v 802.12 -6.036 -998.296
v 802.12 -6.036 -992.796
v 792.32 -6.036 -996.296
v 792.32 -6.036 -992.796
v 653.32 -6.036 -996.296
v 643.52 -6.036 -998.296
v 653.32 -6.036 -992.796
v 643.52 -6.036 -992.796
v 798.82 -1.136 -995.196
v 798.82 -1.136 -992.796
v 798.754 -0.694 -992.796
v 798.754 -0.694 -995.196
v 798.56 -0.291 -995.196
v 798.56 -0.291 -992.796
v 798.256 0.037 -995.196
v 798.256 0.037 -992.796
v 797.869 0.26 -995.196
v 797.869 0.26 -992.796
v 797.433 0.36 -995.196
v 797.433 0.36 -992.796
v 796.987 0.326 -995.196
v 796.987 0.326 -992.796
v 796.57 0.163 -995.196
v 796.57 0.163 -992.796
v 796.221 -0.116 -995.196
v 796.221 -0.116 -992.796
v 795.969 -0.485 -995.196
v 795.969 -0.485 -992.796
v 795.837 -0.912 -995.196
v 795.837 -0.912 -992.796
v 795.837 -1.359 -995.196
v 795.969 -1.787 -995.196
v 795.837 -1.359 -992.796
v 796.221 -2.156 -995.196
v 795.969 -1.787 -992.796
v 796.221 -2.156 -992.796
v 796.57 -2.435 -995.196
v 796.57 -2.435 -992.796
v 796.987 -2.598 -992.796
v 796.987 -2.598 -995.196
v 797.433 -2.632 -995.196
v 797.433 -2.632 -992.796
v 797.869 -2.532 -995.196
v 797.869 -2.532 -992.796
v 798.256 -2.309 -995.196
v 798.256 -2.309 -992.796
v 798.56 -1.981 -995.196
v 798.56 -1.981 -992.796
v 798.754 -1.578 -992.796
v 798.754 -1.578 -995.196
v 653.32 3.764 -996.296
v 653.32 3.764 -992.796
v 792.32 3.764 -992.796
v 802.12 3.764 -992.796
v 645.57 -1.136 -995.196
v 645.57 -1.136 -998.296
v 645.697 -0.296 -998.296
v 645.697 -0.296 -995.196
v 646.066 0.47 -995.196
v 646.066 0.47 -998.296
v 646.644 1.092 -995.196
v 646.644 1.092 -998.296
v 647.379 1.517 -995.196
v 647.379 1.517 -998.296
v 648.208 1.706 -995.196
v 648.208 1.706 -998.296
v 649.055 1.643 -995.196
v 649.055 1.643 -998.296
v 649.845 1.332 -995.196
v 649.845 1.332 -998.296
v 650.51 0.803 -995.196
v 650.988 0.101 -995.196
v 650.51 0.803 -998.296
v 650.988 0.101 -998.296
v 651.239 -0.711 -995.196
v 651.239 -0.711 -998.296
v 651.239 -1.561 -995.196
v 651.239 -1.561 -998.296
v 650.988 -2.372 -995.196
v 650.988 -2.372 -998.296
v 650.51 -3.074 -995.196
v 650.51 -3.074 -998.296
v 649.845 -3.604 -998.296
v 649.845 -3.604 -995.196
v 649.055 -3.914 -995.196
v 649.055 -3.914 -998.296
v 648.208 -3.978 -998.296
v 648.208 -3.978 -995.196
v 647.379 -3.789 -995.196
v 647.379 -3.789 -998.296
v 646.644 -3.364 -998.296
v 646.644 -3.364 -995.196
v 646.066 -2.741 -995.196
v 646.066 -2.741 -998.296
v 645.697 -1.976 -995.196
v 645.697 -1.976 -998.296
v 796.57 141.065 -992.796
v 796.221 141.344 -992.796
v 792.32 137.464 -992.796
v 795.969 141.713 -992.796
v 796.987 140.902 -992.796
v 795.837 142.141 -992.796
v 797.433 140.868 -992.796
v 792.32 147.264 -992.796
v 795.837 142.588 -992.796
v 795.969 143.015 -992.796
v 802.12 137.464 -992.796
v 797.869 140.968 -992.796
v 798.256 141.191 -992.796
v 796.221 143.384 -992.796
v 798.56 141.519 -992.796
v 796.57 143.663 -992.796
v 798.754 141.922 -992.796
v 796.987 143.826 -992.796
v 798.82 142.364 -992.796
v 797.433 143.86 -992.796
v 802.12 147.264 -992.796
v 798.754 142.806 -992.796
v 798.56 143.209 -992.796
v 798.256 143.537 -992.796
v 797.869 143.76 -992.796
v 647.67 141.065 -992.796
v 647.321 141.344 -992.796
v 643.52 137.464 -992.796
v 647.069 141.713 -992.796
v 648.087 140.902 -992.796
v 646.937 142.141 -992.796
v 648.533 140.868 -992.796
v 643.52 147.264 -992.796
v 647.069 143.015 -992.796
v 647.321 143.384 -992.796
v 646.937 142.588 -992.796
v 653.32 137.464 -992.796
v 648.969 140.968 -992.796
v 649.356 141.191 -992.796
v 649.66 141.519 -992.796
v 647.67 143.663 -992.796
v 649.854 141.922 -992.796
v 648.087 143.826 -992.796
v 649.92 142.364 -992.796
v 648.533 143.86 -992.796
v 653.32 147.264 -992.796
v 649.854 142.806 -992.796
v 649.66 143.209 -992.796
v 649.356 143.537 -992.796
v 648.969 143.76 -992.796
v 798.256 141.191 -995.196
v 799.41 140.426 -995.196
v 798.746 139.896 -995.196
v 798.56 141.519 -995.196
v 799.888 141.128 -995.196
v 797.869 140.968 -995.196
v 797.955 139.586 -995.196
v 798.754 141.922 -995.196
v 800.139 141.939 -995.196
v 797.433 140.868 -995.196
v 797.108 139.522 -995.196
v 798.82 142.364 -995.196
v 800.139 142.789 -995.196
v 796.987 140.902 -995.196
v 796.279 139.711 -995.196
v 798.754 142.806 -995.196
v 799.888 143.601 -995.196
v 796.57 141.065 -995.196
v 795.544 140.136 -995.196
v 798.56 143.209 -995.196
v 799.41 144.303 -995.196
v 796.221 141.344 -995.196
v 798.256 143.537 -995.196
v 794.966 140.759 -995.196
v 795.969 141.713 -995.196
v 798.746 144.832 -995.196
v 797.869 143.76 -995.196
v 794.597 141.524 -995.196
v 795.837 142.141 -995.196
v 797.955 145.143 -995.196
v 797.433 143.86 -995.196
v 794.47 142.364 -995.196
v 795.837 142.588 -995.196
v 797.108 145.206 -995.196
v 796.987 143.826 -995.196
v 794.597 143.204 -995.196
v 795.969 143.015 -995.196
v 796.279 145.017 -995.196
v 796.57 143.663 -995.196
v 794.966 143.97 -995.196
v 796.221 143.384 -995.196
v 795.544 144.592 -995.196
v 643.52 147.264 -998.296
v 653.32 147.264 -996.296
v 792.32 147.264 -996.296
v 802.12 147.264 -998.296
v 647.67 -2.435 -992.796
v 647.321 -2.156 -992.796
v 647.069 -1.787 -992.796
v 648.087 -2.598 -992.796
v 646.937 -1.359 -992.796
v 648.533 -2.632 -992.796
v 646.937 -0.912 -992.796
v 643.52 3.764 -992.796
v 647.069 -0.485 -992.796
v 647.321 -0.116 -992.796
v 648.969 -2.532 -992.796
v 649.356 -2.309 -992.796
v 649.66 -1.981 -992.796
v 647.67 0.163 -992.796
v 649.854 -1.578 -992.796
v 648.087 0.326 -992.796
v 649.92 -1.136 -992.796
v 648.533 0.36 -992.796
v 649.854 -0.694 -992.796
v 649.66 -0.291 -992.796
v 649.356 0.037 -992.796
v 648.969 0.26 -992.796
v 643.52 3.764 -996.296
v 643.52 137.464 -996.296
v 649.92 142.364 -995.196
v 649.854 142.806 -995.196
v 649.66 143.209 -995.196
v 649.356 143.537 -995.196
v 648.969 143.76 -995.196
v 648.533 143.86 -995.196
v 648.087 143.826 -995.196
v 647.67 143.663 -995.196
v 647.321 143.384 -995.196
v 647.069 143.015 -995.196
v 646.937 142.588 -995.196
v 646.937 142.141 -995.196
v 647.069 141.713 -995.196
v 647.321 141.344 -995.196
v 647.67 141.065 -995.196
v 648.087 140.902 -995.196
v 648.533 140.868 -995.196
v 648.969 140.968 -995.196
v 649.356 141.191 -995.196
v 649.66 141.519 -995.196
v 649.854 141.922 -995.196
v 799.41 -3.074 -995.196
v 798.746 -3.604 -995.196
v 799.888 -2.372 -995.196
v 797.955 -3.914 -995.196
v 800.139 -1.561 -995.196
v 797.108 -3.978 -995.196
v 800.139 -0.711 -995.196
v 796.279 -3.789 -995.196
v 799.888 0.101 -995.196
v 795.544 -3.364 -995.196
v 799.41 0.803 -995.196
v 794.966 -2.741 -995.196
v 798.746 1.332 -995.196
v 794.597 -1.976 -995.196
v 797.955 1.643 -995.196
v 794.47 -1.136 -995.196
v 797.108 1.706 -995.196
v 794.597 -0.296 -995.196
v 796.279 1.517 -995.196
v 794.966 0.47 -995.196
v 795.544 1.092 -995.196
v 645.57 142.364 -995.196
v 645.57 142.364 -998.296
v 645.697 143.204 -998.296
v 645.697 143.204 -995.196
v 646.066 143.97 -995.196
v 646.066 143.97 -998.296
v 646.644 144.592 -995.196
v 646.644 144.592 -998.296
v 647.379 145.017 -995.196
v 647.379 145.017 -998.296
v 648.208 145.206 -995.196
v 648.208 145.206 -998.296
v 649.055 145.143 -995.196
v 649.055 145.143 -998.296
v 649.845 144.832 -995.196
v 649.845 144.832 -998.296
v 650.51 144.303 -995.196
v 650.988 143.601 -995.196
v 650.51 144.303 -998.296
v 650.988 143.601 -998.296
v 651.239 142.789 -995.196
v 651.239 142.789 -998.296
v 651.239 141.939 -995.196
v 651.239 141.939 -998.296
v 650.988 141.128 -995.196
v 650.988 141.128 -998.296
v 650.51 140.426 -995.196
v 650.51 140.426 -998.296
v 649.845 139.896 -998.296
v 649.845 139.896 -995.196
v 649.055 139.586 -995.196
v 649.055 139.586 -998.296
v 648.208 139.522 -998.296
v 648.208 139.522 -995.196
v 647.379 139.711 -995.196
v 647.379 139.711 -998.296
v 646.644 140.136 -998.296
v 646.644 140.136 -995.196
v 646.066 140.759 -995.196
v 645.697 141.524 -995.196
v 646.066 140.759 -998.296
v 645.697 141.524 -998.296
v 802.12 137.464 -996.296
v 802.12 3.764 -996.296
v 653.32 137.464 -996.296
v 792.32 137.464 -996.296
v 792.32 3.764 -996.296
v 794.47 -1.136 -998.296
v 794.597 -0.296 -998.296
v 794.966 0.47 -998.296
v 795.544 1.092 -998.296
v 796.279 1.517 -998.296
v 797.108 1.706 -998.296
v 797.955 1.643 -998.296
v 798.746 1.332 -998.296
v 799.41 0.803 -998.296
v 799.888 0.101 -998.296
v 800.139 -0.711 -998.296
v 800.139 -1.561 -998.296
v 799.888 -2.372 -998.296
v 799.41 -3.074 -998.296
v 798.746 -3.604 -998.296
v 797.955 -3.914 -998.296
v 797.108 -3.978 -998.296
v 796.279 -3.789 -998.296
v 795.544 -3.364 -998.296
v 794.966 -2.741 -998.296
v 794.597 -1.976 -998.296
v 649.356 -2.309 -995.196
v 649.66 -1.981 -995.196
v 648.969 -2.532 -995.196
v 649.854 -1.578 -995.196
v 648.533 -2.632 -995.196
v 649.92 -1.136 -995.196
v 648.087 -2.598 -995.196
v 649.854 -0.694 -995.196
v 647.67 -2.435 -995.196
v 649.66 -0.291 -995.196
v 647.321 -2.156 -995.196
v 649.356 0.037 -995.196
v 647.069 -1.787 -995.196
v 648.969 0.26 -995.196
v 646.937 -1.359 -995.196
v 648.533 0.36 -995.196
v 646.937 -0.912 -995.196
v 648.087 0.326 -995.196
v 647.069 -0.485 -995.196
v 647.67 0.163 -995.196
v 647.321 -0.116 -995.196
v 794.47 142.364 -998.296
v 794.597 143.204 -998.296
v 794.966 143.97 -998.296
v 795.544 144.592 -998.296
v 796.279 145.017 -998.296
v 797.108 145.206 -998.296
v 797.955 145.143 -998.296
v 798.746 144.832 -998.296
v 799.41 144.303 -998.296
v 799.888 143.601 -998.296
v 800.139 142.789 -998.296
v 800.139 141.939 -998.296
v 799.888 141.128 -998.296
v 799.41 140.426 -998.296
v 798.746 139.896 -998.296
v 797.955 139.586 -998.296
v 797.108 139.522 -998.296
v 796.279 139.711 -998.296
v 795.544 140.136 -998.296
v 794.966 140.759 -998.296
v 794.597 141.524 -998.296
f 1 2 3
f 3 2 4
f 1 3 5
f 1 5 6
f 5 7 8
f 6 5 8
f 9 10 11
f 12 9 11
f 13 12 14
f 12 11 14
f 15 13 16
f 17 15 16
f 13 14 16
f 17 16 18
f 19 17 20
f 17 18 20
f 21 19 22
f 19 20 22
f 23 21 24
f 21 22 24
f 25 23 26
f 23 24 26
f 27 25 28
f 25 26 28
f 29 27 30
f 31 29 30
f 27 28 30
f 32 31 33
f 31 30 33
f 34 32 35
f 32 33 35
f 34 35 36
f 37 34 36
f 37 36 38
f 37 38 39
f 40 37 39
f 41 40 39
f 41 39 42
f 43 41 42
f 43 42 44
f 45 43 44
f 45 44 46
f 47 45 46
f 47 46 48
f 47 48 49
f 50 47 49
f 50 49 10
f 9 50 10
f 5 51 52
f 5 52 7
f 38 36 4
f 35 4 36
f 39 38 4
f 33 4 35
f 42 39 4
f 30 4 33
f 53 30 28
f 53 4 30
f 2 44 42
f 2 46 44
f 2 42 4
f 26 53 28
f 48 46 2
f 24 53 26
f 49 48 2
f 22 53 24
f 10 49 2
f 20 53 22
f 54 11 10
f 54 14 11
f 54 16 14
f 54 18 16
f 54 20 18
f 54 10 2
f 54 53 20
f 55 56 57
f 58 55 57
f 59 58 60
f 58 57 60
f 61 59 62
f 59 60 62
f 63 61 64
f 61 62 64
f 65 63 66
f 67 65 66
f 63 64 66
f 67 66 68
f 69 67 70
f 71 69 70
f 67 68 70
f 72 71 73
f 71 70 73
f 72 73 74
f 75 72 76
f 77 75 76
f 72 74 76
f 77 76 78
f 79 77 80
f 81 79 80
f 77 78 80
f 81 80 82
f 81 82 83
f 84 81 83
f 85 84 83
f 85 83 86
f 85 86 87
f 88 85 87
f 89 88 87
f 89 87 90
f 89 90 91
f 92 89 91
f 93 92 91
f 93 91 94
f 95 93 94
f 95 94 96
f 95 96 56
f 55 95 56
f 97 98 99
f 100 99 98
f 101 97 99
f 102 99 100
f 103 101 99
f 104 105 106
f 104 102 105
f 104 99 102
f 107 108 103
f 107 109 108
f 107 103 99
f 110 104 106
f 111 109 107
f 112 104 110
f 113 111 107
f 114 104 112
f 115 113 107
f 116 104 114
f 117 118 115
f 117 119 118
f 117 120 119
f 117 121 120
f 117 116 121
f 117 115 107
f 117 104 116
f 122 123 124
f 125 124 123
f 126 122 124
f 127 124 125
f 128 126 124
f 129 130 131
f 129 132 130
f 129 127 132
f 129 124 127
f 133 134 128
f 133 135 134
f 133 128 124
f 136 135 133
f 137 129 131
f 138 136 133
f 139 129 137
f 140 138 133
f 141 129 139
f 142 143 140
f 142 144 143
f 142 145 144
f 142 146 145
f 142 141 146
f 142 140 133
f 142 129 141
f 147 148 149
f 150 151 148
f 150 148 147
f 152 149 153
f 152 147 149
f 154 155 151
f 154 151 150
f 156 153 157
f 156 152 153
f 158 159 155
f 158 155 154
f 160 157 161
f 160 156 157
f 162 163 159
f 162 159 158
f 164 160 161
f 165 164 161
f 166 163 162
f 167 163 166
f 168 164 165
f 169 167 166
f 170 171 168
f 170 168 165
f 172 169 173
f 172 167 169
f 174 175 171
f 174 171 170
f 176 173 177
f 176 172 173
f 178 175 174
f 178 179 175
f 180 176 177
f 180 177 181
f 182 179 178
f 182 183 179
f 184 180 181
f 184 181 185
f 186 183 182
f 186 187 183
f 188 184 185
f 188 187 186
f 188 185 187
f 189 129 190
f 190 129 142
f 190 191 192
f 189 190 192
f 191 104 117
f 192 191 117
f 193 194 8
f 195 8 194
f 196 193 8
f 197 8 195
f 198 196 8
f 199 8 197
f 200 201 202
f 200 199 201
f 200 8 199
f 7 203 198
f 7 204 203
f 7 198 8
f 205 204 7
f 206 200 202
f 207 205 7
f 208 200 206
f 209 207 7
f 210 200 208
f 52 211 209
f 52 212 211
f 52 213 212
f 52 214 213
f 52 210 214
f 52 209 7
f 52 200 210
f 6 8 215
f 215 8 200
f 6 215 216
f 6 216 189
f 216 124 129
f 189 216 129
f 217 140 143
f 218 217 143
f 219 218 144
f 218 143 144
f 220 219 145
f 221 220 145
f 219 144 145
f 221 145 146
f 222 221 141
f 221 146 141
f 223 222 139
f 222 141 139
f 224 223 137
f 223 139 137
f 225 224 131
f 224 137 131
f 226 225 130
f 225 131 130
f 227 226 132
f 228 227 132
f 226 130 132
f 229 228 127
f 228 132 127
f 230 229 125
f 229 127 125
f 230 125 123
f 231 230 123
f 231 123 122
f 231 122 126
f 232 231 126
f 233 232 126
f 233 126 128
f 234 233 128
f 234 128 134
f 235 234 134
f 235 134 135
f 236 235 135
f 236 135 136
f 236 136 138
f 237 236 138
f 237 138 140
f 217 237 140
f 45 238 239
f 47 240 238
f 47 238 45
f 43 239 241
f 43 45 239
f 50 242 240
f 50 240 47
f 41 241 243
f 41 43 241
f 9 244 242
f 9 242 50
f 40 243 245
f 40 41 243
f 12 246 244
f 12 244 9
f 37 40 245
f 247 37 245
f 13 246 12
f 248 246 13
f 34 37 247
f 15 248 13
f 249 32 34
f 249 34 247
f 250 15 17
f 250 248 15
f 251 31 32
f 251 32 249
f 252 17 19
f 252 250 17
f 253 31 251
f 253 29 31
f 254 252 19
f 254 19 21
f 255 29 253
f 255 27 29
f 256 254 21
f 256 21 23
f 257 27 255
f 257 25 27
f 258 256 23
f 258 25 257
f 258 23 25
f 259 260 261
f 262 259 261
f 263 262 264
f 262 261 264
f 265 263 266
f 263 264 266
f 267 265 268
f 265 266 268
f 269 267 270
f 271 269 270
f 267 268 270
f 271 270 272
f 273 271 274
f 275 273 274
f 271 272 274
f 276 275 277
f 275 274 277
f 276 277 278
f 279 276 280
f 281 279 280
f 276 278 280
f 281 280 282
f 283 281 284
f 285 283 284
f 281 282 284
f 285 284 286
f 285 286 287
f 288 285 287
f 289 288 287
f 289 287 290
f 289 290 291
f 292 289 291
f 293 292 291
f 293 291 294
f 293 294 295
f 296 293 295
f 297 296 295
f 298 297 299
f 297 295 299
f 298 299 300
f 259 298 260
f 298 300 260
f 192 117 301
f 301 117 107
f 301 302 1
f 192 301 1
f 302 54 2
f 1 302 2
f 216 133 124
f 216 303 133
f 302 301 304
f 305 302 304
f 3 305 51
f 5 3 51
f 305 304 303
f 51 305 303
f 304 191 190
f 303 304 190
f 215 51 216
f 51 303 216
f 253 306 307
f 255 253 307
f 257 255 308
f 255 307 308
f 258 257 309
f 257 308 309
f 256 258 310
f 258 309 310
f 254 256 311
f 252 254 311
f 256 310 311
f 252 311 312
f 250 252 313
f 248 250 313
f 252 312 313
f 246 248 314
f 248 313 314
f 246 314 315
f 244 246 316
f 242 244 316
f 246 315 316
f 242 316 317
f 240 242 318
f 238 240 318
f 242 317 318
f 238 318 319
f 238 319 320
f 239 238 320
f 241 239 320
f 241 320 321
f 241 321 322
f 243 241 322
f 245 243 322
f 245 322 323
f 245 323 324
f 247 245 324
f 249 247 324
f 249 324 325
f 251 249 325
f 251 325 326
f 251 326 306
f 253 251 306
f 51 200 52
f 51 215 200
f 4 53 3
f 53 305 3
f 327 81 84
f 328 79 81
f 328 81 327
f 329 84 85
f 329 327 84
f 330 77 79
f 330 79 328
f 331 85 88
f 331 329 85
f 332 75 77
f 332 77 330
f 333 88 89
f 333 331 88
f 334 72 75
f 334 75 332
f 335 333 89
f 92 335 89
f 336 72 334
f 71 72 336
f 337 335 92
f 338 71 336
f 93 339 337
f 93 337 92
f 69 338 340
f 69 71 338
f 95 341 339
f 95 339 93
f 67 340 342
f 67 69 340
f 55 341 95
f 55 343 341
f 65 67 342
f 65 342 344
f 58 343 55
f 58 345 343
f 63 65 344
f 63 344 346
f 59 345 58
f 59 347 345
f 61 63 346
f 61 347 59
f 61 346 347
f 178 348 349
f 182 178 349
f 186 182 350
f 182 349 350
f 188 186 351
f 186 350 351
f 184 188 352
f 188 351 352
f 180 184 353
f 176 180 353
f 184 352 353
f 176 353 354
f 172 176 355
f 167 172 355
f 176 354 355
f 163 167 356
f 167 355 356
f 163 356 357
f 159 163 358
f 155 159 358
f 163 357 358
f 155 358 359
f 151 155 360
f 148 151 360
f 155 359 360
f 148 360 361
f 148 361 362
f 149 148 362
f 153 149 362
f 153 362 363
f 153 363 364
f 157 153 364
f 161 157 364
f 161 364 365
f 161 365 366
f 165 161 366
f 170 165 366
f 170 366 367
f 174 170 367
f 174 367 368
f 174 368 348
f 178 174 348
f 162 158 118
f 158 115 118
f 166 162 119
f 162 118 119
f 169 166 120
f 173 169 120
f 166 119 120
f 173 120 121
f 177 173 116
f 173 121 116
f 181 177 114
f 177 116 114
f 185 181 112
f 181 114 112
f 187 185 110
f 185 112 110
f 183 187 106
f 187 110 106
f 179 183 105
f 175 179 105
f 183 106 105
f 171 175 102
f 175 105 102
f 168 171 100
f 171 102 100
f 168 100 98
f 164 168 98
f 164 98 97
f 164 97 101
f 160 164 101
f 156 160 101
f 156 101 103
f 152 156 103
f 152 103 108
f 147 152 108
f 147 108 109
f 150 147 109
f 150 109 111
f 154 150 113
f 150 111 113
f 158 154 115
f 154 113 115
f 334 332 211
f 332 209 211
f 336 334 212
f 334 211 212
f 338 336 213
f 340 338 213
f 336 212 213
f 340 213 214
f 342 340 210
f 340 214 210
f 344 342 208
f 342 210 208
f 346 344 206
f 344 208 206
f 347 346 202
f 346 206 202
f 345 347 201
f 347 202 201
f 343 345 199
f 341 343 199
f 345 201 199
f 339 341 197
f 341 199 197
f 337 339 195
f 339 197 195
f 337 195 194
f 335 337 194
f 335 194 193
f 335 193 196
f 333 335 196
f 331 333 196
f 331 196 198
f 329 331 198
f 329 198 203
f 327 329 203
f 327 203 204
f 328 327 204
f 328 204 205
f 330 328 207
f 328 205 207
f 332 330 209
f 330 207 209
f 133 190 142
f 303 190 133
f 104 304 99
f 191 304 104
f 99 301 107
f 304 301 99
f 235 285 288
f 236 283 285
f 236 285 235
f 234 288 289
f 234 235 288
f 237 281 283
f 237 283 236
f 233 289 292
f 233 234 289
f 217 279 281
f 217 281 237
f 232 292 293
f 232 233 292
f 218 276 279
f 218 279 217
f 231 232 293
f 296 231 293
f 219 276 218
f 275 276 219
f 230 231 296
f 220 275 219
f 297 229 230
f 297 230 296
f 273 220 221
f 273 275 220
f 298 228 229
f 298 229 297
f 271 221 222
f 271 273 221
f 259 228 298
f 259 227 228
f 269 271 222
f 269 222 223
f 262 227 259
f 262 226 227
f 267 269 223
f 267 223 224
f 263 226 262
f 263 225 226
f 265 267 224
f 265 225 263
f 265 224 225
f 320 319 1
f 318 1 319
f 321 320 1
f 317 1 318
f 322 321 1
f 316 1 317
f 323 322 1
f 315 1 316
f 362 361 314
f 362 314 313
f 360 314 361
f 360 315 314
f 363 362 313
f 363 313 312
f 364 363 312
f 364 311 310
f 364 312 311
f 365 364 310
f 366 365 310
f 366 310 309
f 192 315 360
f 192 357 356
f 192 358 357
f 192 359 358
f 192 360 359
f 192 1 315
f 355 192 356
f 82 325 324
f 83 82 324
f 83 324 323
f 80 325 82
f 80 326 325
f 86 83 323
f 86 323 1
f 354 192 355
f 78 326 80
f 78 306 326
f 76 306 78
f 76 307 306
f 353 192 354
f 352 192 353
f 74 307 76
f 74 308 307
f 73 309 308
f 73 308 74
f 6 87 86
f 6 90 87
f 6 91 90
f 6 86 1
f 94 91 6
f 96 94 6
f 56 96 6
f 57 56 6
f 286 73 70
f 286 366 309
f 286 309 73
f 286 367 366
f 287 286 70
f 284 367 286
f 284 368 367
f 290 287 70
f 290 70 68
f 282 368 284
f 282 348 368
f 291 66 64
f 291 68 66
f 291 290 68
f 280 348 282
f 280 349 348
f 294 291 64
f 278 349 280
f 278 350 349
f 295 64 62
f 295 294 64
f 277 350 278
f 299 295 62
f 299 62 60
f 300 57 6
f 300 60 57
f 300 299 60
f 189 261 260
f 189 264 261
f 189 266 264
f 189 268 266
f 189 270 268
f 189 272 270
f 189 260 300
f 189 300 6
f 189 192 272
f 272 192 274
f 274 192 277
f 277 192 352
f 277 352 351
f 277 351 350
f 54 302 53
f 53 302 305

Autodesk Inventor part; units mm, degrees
ref_plane "YZ Plane" through (0, 0, 0) normal (1, 0, 0) x (0, 1, 0)
ref_plane "XZ Plane" through (0, 0, 0) normal (0, 1, 0) x (-1, 0, 0)
ref_plane "XY Plane" through (0, 0, 0) normal (0, 0, 1) x (1, 0, 0)
ref_plane "Arbeitsebene1" through (796.2209, 70.6141, -996.2958) normal (0, 0, -1) x (-1, 0, 0)
sketch "Skizze1" plane through (796.2209, 70.6141, -996.2958) normal (0, 0, -1) x (-1, 0, 0)
  line L0 (-3.9996, -76.75) -> (4.0004, -76.75) construction
  line L1 (-3.9996, 76.75) -> (-3.9996, -76.75) construction
  line L2 (4.0004, 76.75) -> (-3.9996, 76.75) construction
  line L3 (4.0004, 84.25) -> (4.0004, 76.75) construction
  line L4 (-37.8996, 84.25) -> (4.0004, 84.25) construction
  line L5 (-37.8996, 1.75) -> (-37.8996, 84.25) construction
  line L6 (-133.3996, 1.75) -> (-37.8996, 1.75) construction
  line L7 (-133.3996, -84.25) -> (-133.3996, 1.75) construction
  line L8 (4.0004, -84.25) -> (-133.3996, -84.25) construction
  line L9 (4.0004, -76.75) -> (4.0004, -84.25) construction
  line L10 (150.8004, -76.75) -> (142.8004, -76.75) construction
  line L11 (142.8004, -76.75) -> (142.8004, -84.25) construction
  line L12 (142.8004, -84.25) -> (280.2004, -84.25) construction
  line L13 (280.2004, -84.25) -> (280.2004, 1.75) construction
  line L14 (280.2004, 1.75) -> (184.7004, 1.75) construction
  line L15 (184.7004, 1.75) -> (184.7004, 84.25) construction
  line L16 (184.7004, 84.25) -> (142.8004, 84.25) construction
  line L17 (142.8004, 84.25) -> (142.8004, 76.75) construction
  line L18 (142.8004, 76.75) -> (150.8004, 76.75) construction
  line L19 (150.8004, 76.75) -> (150.8004, -76.75) construction
  line L20 (-5.9996, 76.75) -> (-5.9996, -76.75) construction
  line L21 (152.8004, 76.75) -> (152.8004, -76.75) construction
  line L22 (-5.9996, 76.75) -> (152.8004, 76.75) construction
  line L23 (-5.9996, -76.75) -> (152.8004, -76.75) construction
  line L24 (73.4004, -76.75) -> (73.4004, 76.75) construction
  line L25 (-5.8996, -76.65) -> (152.7004, -76.65)
  line L26 (152.7004, -76.65) -> (152.7004, 76.65)
  line L27 (152.7004, 76.65) -> (-5.8996, 76.65)
  line L28 (-5.8996, 76.65) -> (-5.8996, -76.65)
  line L29 (-5.8996, -76.65) -> (152.7004, 76.65) construction
  line L30 (152.7004, -76.65) -> (-5.8996, 76.65) construction
  point P0 (796.2209, -70.6141)
  point P1 (73.4004, 0)
  dimension "d24" = 0.1
  dimension "d25" = 0.1
extrude "Extrusion1" add sketch "Skizze1" along normal blind 2
sketch "Skizze2" plane through (796.2209, 70.6141, -996.2958) normal (0, 0, 1) x (1, 0, 0)
  line L0 (-152.8004, -76.75) -> (-142.8004, -76.75) construction
  line L1 (-142.8004, -66.75) -> (-152.8004, -66.75) construction
  line L2 (-142.8004, -76.75) -> (-142.8004, -66.75) construction
  line L3 (-152.8004, -66.75) -> (-152.8004, -76.75) construction
  line L4 (-4.0004, -66.75) -> (5.9996, -66.75) construction
  line L5 (-4.0004, -76.75) -> (-4.0004, -66.75) construction
  line L6 (5.9996, -66.75) -> (5.9996, -76.75) construction
  line L7 (5.9996, -76.75) -> (-4.0004, -76.75) construction
  line L8 (-152.8004, 66.75) -> (-142.8004, 66.75) construction
  line L9 (-142.8004, 66.75) -> (-142.8004, 76.75) construction
  line L10 (-142.8004, 76.75) -> (-152.8004, 76.75) construction
  line L11 (-152.8004, 76.75) -> (-152.8004, 66.75) construction
  line L12 (-4.0004, 66.75) -> (-4.0004, 76.75) construction
  line L13 (5.9996, 66.75) -> (-4.0004, 66.75) construction
  line L14 (-4.0004, 76.75) -> (5.9996, 76.75) construction
  line L15 (5.9996, 76.75) -> (5.9996, 66.75) construction
  line L16 (-142.9004, -76.65) -> (-152.7004, -76.65)
  line L17 (-152.7004, -76.65) -> (-152.7004, -66.85)
  line L18 (-152.7004, -66.85) -> (-142.9004, -66.85)
  line L19 (-142.9004, -66.85) -> (-142.9004, -76.65)
  line L20 (5.8996, -76.65) -> (-152.7004, -76.65) projected
  line L21 (5.8996, -76.65) -> (5.8996, -66.85)
  line L22 (5.8996, -66.85) -> (-3.9004, -66.85)
  line L23 (-3.9004, -66.85) -> (-3.9004, -76.65)
  line L24 (-3.9004, -76.65) -> (5.8996, -76.65)
  line L25 (5.8996, 76.65) -> (5.8996, -76.65) projected
  line L26 (-3.9004, 66.85) -> (-3.9004, 76.65)
  line L27 (-3.9004, 76.65) -> (5.8996, 76.65)
  line L28 (5.8996, 76.65) -> (5.8996, 66.85)
  line L29 (5.8996, 66.85) -> (-3.9004, 66.85)
  line L30 (-142.9004, 76.65) -> (-142.9004, 66.85)
  line L31 (-142.9004, 66.85) -> (-152.7004, 66.85)
  line L32 (-152.7004, 66.85) -> (-152.7004, 76.65)
  line L33 (-152.7004, 76.65) -> (-142.9004, 76.65)
  line L34 (-152.7004, 76.65) -> (5.8996, 76.65) projected
  point P0 (-796.2209, -70.6141)
extrude "Extrusion2" add sketch "Skizze2" along normal blind 3.5
sketch "Skizze3" plane through (796.2209, 70.6141, -992.7958) normal (0, 0, 1) x (1, 0, 0)
  circle A0 centre (0.9996, 71.75) radius 1.75 construction
  circle A1 centre (0.9996, -71.75) radius 1.75 construction
  circle A2 centre (-147.8004, 71.75) radius 1.75 construction
  circle A3 centre (-147.8004, -71.75) radius 1.75 construction
  line L0 (-142.9004, 66.85) -> (-142.9004, 76.65) projected
  line L1 (-142.9004, 76.65) -> (-152.7004, 76.65) projected
  line L2 (-152.7004, 76.65) -> (-152.7004, 66.85) projected
  line L3 (-152.7004, 66.85) -> (-142.9004, 66.85) projected
  circle A4 centre (-147.8004, 71.75) radius 1.5
  circle A5 centre (1.0996, 71.75) radius 1.5
  circle A6 centre (1.0996, -71.75) radius 1.5
  circle A7 centre (-147.8004, -71.75) radius 1.5
  point P0 (-796.2209, -70.6141)
extrude "Extrusion3" cut sketch "Skizze3" against normal blind 15.5 contours A4 | A5 | A6 | A7
sketch "Skizze4" plane through (796.2209, 70.6141, -998.2958) normal (0, 0, -1) x (-1, 0, 0)
  circle A0 centre (147.8004, 71.75) radius 1.5 construction
  circle A1 centre (147.8004, -71.75) radius 1.5 construction
  circle A2 centre (-1.0996, -71.75) radius 1.5 construction
  circle A3 centre (147.8004, -71.75) radius 2.85
  circle A4 centre (-1.0996, -71.75) radius 2.85
  circle A5 centre (147.8004, 71.75) radius 2.85
  circle A6 centre (-1.0996, 71.75) radius 2.85
  circle A7 centre (-1.0996, 71.75) radius 1.5 construction
  point P0 (796.2209, -70.6141)
  dimension "d27" = 5.7
  dimension "d28" = 5.7
  dimension "d29" = 5.7
  dimension "d30" = 5.7
extrude "Extrusion4" cut sketch "Skizze4" against normal blind 3.1
equation "\"d28\" = d27"
equation "\"d29\" = d27"
equation "\"d30\" = d27"
properties part number "Backplate-housing"
